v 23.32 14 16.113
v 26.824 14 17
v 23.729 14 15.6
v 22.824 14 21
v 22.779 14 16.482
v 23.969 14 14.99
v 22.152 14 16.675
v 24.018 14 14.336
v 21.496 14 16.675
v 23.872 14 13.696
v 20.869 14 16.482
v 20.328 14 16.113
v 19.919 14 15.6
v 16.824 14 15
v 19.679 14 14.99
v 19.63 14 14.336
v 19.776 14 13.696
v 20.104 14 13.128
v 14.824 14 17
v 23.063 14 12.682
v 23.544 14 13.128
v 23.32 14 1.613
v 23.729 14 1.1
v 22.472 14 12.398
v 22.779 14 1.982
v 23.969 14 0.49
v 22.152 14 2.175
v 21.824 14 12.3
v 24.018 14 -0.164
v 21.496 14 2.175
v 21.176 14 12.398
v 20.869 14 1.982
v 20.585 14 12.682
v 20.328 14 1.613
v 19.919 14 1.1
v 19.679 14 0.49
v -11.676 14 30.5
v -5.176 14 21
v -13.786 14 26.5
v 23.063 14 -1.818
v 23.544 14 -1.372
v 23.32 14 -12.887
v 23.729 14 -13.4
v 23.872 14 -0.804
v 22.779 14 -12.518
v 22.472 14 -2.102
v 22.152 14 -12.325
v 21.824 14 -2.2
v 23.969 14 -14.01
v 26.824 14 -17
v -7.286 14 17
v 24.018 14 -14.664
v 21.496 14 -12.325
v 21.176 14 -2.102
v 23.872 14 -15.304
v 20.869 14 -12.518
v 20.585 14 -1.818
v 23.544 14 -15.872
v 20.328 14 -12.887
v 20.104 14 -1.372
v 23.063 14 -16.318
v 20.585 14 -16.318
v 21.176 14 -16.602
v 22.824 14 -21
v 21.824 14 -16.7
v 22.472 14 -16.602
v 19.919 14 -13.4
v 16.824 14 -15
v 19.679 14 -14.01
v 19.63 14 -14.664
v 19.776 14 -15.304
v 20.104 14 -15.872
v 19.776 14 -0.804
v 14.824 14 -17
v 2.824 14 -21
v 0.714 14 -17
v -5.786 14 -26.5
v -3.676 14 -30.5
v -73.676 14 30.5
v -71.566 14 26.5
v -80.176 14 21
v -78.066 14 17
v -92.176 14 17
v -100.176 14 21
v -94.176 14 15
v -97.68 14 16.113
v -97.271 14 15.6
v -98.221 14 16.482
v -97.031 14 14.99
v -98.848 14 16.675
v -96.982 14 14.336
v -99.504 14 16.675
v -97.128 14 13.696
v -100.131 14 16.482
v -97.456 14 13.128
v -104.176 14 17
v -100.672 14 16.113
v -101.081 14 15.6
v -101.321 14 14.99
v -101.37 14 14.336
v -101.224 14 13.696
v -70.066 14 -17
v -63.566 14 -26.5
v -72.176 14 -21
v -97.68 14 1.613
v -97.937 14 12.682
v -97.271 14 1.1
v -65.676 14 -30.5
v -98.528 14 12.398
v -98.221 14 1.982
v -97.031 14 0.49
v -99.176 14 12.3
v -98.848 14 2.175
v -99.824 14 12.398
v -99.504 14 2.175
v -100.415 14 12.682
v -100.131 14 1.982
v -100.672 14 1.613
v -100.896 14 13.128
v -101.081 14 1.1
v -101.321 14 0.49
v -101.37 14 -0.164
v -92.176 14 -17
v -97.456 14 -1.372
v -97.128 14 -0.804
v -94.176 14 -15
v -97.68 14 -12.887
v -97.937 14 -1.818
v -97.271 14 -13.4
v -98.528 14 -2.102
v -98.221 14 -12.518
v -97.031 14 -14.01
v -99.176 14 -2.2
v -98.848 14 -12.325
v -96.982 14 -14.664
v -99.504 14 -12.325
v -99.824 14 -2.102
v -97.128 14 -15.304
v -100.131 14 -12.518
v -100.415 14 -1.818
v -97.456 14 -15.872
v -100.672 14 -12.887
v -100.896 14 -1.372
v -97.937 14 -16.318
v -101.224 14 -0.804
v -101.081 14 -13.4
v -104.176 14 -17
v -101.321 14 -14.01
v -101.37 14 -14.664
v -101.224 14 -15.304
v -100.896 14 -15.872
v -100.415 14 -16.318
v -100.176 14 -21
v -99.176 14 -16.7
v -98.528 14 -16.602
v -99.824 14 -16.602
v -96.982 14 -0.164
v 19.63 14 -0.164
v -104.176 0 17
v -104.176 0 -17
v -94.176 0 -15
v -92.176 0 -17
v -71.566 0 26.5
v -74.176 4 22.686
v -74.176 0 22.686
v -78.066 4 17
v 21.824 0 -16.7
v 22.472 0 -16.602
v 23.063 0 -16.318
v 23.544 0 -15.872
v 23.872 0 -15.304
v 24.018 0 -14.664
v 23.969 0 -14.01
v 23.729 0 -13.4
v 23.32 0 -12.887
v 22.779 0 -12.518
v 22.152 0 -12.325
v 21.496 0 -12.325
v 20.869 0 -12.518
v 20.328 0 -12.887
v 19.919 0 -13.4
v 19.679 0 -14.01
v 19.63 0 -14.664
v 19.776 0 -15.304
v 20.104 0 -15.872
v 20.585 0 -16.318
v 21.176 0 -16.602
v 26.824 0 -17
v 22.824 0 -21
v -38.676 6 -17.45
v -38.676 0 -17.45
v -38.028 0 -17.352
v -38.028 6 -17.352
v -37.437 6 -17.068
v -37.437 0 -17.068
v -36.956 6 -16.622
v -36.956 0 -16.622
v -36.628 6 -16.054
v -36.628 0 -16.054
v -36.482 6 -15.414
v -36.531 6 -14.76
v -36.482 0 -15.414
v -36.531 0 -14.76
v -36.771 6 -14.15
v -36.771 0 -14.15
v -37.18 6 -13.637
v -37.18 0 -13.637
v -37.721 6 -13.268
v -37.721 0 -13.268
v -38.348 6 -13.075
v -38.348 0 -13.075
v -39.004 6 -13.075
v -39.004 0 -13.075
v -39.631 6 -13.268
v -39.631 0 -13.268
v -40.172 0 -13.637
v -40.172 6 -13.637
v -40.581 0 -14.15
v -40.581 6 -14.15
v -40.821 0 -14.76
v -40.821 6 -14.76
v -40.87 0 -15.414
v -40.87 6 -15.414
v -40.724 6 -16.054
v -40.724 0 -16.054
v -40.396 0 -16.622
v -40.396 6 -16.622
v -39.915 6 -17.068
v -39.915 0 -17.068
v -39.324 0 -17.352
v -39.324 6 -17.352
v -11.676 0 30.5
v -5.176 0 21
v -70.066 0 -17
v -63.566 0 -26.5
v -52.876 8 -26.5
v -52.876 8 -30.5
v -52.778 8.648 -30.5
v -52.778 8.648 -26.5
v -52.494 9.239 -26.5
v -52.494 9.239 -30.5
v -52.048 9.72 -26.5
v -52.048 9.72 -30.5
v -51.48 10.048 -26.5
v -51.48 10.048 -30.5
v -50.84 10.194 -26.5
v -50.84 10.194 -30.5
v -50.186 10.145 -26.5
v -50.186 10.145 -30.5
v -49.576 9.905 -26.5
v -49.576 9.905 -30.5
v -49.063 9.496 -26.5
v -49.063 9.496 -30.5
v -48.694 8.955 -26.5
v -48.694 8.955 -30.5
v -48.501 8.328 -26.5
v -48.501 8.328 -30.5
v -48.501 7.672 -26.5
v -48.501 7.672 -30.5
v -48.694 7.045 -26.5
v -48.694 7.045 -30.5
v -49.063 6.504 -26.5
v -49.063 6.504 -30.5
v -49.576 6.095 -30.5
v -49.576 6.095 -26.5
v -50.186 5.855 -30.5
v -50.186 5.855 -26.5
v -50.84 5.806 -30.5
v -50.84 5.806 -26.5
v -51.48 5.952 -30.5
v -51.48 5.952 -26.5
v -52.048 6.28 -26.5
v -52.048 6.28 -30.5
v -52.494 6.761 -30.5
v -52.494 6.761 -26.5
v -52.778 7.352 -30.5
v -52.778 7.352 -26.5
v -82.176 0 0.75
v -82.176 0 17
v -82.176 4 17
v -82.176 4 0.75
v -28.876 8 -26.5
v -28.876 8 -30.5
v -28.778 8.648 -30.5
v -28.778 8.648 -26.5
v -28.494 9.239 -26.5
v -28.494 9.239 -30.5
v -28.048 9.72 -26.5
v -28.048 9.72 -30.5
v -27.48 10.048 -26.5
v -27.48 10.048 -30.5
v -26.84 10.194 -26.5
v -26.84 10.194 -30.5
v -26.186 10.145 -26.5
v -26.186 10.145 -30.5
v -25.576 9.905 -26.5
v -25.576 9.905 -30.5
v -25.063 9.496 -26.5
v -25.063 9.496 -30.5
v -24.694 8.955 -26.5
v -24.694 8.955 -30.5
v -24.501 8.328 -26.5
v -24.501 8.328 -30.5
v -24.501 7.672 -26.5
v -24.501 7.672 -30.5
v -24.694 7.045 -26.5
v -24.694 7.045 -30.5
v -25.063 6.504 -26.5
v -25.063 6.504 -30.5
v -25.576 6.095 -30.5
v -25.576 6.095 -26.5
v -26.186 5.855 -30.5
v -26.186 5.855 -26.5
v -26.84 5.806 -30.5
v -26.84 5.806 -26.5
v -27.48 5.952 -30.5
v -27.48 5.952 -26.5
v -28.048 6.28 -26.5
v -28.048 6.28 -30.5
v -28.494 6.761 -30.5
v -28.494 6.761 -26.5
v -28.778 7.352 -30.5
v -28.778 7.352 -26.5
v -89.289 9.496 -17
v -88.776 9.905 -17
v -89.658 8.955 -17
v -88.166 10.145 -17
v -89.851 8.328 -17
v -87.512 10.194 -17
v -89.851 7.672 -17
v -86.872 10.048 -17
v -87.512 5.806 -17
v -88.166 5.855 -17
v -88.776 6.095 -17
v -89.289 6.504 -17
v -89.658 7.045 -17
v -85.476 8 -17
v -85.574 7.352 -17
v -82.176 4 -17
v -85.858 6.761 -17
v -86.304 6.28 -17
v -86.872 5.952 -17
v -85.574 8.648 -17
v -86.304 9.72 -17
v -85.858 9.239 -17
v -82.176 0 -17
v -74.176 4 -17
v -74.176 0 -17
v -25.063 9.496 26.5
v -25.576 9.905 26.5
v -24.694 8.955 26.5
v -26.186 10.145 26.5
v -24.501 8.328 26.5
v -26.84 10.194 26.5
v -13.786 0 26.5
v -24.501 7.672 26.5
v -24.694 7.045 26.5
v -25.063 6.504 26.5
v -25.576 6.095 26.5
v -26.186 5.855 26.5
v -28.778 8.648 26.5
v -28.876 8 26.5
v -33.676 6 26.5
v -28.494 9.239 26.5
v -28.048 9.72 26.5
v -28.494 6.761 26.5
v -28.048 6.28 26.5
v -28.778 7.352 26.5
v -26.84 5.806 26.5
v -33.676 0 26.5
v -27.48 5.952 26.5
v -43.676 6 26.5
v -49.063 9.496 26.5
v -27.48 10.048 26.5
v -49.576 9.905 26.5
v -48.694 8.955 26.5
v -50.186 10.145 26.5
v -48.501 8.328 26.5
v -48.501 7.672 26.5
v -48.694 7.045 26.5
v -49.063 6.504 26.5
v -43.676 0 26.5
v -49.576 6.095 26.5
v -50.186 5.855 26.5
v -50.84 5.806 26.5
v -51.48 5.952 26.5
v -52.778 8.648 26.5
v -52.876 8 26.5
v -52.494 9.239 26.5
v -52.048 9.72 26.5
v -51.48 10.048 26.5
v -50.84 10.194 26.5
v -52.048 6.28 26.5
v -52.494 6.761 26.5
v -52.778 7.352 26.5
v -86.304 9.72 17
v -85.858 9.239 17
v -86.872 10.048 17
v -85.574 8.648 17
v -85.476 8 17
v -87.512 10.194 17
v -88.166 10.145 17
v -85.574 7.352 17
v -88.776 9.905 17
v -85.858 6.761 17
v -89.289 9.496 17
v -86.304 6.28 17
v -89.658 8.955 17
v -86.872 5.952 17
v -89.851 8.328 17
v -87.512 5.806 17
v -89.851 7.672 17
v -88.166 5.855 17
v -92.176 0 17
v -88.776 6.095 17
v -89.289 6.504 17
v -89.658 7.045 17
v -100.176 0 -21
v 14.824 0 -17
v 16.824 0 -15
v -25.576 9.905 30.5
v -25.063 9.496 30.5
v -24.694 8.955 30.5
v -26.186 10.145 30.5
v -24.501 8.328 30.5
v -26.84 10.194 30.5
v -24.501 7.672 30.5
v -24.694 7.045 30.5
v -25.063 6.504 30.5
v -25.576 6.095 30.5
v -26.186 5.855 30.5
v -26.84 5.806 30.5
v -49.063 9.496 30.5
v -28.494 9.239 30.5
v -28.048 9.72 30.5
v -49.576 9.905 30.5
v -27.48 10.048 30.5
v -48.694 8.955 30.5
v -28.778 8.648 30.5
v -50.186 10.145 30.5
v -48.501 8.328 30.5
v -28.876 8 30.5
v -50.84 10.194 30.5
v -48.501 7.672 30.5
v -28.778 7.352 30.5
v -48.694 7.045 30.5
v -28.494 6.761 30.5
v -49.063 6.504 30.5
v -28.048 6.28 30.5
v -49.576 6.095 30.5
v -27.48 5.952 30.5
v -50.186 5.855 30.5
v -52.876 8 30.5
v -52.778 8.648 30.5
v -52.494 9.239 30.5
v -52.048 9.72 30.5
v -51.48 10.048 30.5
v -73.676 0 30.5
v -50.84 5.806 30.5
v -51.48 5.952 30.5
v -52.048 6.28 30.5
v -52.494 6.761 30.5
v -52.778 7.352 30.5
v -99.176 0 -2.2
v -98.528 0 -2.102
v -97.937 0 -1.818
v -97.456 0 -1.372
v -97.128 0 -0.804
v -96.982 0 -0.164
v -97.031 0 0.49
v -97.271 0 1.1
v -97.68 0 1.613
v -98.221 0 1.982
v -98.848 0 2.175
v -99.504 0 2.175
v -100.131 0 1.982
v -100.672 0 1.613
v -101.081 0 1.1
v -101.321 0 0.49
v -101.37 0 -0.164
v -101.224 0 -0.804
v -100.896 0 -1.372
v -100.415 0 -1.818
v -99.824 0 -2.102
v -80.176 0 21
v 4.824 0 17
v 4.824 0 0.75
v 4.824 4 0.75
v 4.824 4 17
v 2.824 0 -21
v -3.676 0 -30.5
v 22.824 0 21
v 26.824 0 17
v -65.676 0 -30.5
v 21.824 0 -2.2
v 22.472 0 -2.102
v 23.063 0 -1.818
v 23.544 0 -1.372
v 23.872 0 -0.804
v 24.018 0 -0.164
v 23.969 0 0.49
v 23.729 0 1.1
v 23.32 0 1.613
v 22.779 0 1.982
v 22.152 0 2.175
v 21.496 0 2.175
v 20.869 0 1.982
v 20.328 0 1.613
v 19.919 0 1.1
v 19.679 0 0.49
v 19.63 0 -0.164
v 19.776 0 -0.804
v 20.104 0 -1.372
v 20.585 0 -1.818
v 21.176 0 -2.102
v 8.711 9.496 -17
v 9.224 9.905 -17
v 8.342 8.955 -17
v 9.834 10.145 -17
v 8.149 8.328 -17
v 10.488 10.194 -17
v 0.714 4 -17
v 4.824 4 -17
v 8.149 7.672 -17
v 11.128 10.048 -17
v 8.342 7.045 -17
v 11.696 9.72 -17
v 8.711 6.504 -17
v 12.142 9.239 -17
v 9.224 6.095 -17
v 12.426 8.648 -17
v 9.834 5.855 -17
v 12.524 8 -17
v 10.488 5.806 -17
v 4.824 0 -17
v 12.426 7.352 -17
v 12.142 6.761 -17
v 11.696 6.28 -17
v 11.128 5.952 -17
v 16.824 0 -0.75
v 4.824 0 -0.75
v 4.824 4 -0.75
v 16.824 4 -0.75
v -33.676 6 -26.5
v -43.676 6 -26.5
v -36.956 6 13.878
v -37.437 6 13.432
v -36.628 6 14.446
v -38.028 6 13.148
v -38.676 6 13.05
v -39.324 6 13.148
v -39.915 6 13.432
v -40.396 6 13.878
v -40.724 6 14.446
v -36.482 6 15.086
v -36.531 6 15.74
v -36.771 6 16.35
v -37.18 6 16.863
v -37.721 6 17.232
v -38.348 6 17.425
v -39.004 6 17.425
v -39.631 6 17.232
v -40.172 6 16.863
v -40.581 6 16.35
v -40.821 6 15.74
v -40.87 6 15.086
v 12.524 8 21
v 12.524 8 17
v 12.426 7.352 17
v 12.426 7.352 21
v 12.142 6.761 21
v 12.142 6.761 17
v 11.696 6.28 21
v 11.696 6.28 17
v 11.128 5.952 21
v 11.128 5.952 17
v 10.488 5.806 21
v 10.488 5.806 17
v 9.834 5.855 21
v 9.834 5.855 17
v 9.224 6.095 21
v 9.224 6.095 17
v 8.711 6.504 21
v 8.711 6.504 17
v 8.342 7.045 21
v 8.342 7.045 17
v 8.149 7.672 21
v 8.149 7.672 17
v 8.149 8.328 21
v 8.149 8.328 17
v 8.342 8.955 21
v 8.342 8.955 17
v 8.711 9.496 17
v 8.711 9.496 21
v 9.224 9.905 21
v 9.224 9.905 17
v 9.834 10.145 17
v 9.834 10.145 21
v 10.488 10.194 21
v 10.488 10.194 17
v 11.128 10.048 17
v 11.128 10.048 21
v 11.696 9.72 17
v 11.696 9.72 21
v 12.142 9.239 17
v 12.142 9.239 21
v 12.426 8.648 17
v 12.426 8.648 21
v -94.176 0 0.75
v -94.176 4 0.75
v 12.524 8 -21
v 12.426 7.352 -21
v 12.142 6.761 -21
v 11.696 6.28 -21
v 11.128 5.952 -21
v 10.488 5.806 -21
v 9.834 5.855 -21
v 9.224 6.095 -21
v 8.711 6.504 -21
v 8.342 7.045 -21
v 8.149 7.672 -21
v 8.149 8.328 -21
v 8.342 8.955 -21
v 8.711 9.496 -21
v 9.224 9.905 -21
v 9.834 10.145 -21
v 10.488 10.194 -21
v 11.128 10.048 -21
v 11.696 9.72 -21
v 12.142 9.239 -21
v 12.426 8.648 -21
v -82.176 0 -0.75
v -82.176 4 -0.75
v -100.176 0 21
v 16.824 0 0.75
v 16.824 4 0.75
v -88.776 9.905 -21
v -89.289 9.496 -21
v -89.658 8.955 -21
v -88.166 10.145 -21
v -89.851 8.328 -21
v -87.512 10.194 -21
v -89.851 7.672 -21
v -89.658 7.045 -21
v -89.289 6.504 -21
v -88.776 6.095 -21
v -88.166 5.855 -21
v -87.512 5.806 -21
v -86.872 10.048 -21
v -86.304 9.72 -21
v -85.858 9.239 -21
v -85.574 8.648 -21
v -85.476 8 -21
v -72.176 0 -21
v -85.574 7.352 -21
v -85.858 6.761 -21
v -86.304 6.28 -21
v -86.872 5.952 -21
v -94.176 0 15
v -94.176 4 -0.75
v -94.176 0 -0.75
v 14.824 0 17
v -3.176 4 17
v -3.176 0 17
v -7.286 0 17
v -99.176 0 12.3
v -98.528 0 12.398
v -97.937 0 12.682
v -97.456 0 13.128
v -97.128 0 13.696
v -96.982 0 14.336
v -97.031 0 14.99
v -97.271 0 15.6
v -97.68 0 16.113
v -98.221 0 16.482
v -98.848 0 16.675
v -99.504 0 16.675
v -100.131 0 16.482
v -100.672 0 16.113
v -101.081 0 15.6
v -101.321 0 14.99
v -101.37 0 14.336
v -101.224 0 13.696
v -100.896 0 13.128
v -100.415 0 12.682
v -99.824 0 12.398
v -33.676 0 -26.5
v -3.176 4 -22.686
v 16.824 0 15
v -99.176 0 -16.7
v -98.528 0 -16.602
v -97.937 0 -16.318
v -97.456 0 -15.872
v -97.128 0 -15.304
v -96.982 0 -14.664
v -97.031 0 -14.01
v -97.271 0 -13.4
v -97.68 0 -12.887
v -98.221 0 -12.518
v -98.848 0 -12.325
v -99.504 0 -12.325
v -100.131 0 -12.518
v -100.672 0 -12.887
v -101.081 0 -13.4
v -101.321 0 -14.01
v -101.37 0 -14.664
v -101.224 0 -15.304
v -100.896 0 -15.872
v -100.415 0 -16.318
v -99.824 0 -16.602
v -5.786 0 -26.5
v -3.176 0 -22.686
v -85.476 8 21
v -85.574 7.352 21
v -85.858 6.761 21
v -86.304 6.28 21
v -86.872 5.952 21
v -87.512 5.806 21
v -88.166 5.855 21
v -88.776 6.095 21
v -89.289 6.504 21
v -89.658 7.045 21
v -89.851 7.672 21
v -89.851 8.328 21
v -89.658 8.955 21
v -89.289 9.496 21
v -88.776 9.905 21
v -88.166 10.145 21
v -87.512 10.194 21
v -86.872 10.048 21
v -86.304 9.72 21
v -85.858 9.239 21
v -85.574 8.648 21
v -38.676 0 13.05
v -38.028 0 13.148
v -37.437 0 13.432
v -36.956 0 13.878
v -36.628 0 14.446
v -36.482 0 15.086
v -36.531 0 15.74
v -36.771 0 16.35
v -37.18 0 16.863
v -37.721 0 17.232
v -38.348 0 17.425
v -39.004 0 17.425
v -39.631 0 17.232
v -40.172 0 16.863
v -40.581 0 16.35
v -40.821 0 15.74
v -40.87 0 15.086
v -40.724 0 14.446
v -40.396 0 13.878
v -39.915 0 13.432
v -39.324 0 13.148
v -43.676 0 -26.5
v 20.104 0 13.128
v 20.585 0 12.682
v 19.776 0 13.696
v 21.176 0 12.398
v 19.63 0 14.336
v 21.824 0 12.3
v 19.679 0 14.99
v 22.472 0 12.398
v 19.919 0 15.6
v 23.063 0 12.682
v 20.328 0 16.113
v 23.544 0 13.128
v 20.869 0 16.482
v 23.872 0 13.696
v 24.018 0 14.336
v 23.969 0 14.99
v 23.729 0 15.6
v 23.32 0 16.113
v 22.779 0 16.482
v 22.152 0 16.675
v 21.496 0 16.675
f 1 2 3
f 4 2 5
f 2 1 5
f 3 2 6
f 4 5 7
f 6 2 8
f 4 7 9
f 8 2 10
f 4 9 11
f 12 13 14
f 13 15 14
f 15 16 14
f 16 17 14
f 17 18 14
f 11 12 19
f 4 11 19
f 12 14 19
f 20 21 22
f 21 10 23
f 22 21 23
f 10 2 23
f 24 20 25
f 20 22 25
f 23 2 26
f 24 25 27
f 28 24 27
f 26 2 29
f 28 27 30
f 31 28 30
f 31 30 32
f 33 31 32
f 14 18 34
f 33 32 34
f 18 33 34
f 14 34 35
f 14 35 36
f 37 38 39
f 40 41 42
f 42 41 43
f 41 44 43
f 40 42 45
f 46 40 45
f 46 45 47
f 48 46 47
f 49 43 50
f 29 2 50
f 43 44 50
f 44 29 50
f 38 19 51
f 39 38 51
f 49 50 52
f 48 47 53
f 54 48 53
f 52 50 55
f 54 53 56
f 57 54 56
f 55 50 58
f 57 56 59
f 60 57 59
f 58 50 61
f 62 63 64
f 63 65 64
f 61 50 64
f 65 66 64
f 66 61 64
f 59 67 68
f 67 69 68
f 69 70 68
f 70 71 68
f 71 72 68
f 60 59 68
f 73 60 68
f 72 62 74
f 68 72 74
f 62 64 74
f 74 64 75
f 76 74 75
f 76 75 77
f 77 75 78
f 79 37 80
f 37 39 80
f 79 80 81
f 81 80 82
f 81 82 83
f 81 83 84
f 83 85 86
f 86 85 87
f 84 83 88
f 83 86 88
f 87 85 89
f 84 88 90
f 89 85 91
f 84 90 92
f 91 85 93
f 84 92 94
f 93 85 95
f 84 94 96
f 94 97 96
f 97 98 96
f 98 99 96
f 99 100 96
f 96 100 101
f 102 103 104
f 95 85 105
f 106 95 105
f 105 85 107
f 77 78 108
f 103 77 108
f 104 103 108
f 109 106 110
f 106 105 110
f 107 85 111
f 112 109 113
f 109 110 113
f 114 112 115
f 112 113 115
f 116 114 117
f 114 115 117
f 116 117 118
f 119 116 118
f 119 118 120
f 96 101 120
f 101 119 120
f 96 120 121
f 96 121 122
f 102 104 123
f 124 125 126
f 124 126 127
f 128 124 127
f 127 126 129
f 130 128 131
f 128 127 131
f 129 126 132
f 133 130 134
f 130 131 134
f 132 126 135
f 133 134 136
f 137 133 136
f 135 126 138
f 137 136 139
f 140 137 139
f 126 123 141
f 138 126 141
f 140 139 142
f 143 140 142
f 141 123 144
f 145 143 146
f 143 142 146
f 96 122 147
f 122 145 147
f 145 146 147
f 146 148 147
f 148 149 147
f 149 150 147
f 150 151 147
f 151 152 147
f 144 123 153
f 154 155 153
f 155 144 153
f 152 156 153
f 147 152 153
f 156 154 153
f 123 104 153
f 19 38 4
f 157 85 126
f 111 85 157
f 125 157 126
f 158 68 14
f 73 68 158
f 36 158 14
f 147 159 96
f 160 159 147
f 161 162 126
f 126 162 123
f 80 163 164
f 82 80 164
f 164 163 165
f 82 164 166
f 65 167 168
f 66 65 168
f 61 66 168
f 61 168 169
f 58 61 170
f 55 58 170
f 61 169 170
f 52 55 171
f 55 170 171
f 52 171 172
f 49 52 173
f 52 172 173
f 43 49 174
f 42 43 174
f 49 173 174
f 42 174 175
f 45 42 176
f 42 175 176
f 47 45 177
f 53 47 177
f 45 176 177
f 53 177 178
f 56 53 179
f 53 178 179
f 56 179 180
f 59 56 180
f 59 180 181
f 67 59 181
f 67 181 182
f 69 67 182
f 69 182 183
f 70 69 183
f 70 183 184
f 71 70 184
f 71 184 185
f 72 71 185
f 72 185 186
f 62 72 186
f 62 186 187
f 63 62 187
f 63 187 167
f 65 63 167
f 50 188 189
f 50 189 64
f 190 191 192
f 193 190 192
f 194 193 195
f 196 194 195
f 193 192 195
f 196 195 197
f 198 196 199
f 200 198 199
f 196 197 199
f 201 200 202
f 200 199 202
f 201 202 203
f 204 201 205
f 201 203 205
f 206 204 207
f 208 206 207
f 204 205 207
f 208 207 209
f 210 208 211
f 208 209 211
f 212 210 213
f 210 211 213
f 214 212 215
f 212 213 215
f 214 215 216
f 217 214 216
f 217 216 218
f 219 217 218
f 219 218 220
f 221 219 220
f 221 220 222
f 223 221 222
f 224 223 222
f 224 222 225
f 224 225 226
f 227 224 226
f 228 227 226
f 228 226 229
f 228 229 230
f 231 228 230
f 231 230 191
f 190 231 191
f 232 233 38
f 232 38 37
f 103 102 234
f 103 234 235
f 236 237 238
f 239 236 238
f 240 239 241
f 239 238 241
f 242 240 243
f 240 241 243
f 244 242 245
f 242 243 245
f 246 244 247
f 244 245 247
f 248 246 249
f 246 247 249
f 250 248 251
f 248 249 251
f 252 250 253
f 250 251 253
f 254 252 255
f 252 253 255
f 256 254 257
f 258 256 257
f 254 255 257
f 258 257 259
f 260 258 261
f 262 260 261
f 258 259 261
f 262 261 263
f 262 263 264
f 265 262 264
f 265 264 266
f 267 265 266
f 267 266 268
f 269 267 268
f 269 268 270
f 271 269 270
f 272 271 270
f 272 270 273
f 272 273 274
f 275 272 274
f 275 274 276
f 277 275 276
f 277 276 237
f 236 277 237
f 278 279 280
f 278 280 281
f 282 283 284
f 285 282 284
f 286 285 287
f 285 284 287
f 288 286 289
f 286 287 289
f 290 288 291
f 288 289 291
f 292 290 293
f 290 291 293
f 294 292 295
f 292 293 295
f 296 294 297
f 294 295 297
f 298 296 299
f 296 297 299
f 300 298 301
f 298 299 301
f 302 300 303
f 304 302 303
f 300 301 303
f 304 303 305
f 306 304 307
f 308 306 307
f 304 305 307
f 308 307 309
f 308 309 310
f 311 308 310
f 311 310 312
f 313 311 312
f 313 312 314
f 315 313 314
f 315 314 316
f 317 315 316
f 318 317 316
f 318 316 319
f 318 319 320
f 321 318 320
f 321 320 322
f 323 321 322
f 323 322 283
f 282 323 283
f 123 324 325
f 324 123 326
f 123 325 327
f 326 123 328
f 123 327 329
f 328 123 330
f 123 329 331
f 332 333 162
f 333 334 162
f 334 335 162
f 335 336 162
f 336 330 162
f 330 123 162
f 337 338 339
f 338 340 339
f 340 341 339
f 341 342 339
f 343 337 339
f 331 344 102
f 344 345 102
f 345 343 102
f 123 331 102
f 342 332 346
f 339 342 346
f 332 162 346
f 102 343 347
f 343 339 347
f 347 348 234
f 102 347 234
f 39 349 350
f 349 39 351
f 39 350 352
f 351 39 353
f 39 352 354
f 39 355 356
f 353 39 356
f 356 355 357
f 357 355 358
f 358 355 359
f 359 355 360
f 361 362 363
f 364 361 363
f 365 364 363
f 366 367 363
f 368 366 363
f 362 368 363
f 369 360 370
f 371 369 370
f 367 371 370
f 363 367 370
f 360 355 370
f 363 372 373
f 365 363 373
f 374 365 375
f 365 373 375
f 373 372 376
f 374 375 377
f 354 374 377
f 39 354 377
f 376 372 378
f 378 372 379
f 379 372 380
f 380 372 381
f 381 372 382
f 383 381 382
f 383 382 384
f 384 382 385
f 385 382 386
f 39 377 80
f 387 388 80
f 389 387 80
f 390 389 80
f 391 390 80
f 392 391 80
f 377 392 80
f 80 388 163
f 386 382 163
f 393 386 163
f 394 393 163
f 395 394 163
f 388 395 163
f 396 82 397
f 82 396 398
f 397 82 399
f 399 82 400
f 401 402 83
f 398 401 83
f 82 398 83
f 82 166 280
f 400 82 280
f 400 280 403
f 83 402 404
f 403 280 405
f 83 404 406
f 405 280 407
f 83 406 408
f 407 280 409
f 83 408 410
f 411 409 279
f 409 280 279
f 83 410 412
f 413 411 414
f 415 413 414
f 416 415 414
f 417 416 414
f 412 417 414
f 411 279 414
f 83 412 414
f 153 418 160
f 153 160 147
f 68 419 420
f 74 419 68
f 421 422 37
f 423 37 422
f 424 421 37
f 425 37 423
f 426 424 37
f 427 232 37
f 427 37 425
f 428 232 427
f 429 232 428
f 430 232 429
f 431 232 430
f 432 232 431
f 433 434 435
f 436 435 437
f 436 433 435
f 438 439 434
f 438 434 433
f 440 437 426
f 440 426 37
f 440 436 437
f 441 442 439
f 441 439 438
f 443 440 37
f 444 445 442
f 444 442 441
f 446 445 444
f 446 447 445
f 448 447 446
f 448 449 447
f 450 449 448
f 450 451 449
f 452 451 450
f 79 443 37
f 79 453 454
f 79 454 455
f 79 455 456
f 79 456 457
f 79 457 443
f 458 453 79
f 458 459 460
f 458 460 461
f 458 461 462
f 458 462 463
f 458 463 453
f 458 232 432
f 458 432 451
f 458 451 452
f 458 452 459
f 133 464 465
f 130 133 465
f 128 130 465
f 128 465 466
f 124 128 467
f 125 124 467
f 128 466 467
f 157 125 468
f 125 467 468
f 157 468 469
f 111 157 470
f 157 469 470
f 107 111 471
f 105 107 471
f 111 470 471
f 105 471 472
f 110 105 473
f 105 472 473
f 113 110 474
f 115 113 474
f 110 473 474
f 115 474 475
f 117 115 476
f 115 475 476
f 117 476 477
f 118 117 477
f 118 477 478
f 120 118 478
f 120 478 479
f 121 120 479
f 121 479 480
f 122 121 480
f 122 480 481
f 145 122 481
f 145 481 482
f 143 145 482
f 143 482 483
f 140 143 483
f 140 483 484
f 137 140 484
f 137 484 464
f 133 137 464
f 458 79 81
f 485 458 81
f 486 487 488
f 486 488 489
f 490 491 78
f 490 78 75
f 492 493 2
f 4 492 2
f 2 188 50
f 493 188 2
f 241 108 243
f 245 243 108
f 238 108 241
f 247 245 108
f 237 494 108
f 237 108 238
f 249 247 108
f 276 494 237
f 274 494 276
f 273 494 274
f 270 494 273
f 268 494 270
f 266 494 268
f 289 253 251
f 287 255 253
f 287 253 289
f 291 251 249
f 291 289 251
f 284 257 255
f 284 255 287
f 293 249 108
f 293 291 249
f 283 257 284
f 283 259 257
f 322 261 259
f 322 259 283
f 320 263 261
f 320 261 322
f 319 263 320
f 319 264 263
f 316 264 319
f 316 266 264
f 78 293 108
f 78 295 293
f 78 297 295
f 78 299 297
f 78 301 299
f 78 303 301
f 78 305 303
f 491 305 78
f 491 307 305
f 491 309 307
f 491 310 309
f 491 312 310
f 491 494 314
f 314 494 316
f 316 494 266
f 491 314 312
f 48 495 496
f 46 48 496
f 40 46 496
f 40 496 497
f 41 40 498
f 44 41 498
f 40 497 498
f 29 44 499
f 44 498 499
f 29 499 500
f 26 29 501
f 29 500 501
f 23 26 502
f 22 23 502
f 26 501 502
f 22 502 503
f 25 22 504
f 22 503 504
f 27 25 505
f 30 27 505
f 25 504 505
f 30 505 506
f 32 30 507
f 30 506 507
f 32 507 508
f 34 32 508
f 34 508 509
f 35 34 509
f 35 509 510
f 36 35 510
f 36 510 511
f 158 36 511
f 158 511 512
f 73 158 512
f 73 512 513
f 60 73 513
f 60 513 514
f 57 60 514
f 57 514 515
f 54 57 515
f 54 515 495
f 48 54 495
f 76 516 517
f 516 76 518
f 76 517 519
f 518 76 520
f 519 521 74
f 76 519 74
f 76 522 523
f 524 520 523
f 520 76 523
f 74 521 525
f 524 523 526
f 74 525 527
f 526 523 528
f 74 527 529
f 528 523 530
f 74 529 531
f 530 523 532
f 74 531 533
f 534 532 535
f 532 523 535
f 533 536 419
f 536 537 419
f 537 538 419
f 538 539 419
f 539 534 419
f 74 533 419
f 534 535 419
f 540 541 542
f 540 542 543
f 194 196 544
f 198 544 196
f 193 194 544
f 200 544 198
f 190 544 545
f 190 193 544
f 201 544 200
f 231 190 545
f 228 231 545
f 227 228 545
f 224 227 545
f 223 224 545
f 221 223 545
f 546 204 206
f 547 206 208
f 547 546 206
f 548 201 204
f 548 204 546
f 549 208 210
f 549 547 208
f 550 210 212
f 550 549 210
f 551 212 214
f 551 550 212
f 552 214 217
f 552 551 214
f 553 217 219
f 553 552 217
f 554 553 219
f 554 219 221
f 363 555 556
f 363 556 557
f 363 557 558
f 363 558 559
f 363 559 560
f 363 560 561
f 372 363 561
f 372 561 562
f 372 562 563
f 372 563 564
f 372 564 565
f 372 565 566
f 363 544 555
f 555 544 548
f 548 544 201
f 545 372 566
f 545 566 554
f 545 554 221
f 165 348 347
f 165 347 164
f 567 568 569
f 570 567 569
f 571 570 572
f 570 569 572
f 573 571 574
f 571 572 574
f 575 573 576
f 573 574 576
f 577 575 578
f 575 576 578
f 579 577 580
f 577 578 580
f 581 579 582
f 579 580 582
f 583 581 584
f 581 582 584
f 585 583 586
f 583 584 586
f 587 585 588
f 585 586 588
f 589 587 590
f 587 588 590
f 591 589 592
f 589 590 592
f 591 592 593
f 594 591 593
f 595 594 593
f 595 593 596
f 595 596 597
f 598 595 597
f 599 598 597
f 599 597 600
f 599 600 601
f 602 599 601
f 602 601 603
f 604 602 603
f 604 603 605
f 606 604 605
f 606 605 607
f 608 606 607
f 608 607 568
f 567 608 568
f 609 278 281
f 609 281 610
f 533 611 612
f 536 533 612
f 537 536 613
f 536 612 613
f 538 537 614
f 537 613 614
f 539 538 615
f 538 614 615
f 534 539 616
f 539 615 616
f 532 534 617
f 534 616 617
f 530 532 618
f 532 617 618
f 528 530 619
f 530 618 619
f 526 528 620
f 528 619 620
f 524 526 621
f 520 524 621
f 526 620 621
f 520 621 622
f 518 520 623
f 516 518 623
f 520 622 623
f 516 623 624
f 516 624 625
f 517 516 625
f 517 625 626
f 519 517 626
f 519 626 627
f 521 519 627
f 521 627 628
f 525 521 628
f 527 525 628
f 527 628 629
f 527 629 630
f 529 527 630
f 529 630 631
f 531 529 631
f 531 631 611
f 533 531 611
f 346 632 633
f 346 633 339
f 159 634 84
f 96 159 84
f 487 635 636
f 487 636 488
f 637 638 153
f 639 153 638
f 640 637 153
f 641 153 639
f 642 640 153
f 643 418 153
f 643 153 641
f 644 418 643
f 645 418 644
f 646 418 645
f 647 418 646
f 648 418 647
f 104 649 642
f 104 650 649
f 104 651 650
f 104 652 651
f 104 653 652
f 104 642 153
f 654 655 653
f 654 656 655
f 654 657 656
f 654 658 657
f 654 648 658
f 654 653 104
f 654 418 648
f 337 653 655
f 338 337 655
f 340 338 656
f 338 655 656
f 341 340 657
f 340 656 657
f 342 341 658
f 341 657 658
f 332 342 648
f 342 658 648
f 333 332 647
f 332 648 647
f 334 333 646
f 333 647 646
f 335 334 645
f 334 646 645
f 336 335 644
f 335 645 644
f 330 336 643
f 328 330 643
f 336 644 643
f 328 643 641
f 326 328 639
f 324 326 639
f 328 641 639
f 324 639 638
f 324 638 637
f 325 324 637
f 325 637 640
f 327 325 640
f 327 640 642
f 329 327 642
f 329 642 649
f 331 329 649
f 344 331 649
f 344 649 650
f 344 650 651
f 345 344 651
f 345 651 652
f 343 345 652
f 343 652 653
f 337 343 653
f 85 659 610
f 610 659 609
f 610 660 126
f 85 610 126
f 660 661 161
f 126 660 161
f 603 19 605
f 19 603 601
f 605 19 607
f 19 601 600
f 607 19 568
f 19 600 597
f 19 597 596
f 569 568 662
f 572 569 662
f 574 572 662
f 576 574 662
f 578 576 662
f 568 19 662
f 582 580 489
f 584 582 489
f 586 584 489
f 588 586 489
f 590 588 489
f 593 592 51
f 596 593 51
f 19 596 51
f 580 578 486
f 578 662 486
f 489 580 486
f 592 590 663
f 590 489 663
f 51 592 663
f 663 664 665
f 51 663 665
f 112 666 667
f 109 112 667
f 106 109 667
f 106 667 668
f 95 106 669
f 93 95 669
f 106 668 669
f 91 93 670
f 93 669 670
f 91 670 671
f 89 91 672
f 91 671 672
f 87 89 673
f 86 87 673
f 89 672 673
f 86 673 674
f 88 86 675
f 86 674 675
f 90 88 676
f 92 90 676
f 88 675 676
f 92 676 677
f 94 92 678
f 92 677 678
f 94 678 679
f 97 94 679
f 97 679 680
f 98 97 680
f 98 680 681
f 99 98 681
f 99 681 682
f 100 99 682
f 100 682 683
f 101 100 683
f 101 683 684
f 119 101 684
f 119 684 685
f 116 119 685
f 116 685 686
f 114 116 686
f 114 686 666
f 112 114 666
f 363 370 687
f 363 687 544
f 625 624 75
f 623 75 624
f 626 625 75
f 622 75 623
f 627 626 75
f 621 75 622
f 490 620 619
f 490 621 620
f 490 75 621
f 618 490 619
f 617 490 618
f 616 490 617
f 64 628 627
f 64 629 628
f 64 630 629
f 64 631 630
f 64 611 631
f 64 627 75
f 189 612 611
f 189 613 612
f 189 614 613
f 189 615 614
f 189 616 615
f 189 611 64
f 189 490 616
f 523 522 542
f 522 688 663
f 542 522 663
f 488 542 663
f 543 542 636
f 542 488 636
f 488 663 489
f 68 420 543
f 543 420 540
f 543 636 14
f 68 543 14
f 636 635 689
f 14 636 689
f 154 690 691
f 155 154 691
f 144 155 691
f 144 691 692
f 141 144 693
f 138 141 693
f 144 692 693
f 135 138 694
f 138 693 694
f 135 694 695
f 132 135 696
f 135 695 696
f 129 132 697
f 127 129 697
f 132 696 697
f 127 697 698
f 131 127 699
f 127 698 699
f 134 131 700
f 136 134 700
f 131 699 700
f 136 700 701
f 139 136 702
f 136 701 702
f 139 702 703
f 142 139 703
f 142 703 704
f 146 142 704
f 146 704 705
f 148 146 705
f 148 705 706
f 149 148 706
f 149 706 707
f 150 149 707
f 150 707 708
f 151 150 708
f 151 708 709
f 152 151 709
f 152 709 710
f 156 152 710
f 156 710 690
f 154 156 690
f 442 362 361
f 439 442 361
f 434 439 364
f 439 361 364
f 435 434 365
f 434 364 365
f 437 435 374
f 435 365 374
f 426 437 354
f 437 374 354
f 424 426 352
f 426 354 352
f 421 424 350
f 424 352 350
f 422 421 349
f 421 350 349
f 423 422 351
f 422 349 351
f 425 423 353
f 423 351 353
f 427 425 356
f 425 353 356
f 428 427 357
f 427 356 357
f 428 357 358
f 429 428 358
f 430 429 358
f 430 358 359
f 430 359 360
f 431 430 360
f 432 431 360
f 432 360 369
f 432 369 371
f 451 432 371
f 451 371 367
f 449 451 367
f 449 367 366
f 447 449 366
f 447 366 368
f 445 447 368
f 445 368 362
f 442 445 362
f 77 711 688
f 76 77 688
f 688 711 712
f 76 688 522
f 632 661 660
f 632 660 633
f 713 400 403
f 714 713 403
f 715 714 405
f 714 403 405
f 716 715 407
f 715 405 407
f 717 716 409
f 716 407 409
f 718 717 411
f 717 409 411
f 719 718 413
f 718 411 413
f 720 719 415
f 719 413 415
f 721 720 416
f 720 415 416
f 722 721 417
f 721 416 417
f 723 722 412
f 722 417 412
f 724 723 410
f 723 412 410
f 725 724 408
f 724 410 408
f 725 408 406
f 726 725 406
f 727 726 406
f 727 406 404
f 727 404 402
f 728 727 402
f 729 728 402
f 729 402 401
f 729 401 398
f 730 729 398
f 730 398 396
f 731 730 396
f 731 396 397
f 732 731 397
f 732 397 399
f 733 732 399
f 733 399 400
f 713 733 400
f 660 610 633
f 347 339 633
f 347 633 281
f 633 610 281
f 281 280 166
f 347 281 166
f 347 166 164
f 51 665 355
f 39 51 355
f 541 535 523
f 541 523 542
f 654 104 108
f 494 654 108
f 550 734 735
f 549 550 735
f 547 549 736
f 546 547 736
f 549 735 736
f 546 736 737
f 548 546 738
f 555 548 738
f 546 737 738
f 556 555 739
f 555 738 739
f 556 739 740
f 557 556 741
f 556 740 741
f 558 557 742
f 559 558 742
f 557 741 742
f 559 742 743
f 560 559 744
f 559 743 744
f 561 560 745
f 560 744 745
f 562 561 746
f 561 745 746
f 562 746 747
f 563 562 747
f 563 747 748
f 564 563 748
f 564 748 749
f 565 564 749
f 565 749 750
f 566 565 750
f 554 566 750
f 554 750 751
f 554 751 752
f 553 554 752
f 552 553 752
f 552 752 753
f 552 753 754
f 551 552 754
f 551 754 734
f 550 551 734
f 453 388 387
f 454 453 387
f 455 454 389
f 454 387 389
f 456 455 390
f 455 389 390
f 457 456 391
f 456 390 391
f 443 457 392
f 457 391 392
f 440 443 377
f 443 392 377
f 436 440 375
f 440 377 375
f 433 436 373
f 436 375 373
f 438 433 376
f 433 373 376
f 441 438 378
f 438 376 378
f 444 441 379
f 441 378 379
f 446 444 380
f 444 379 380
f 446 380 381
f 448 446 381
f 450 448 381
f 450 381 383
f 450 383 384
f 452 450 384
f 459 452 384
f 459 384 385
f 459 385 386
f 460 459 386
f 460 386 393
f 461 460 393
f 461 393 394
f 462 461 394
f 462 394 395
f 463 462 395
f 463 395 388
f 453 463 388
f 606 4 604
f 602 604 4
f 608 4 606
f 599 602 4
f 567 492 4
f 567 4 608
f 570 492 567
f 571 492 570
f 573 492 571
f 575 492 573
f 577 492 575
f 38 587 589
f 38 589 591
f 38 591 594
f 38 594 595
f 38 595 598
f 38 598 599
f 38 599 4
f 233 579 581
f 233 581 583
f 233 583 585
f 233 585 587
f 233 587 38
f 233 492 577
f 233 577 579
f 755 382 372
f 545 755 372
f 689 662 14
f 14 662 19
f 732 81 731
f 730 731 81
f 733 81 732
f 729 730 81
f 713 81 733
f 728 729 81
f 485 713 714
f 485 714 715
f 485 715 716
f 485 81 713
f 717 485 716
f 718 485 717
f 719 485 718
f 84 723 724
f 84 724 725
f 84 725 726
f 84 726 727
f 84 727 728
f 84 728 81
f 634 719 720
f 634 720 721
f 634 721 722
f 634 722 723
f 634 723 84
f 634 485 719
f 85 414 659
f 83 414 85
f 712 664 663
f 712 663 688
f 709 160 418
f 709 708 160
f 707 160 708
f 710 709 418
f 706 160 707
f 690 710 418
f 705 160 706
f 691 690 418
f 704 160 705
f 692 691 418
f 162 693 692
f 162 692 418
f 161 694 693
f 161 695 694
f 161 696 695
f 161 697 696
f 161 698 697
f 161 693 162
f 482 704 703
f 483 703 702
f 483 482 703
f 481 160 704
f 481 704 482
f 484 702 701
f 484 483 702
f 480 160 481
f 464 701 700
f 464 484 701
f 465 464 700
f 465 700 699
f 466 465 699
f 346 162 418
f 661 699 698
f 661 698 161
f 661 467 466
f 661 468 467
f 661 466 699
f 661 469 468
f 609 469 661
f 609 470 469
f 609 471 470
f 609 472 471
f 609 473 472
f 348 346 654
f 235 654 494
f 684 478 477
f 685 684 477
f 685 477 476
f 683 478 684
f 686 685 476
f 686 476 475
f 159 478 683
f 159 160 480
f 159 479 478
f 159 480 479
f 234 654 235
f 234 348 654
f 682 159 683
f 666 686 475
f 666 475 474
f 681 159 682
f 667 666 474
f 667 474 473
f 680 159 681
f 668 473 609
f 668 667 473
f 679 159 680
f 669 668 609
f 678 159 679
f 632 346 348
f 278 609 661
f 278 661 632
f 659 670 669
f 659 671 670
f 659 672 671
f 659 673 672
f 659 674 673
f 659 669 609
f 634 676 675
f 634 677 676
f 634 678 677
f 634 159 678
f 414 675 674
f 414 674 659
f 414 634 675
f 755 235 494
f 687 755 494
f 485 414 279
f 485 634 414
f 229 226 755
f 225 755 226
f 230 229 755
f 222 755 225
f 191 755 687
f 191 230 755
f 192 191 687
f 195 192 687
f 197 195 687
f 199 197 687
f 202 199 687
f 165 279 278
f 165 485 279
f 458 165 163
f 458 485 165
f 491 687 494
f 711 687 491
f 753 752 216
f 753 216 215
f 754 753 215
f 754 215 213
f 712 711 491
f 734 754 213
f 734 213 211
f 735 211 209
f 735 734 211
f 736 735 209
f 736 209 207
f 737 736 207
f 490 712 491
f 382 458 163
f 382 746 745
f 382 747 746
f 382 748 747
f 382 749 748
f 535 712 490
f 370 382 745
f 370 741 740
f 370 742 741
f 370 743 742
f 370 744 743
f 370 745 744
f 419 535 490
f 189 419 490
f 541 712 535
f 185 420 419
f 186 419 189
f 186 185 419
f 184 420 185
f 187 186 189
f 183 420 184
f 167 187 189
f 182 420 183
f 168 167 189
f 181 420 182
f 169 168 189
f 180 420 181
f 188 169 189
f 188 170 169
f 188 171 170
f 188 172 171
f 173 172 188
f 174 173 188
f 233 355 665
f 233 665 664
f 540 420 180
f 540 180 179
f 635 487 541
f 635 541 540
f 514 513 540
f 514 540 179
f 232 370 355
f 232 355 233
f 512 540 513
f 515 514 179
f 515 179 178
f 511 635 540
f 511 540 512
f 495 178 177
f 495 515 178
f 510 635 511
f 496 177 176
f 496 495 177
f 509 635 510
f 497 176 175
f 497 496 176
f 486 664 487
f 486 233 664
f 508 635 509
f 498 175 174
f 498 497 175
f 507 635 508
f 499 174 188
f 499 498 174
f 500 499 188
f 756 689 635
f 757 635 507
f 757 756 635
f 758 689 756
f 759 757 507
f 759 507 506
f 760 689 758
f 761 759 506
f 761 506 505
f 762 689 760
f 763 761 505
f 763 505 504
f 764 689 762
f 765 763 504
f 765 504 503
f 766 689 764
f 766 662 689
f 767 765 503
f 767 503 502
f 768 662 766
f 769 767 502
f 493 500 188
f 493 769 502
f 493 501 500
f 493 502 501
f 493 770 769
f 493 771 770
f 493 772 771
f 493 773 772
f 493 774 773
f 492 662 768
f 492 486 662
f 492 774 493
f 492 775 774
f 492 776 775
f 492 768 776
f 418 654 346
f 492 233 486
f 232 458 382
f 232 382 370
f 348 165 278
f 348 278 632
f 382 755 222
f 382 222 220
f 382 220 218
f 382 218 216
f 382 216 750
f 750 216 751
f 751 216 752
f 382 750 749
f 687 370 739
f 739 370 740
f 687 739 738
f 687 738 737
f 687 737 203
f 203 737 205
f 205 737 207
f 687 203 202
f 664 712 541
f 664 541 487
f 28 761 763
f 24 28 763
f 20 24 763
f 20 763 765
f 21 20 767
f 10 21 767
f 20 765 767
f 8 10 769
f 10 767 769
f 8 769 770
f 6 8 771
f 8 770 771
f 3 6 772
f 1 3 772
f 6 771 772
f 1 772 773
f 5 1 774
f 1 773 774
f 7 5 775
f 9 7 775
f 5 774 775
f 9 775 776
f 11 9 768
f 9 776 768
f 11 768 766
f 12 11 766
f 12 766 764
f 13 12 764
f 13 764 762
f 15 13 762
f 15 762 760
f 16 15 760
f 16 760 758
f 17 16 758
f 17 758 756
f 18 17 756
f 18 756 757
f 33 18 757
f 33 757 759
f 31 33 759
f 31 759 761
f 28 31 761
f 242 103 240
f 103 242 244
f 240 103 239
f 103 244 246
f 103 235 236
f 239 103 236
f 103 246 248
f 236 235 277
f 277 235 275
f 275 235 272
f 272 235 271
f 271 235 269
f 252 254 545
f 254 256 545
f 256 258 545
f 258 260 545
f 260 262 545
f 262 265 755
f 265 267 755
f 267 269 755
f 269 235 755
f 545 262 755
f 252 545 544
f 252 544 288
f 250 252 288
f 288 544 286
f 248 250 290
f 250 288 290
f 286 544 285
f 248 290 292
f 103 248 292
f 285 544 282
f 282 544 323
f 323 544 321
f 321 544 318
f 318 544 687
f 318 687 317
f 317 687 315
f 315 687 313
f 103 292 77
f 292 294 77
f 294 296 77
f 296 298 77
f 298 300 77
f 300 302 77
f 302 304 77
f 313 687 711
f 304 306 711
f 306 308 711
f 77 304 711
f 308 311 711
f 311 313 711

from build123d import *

# Parameters (mm, degrees)
BOSS_EXTRUDE1_DEPTH = 14
CUT_EXTRUDE1_REACH  = 16
SKETCH2_R           = 2.2
SKETCH5_R           = 2.2
CUT_EXTRUDE2_DEPTH  = 62
BOSS_EXTRUDE2_REACH = 59
SKETCH6_W           = 10
SKETCH6_H           = 6
BOSS_EXTRUDE3_DEPTH = 4
CUT_EXTRUDE3_REACH  = 16
SKETCH8_R           = 2.2
CHAMFER1_SIZE       = 4
CHAMFER2_SIZE       = 2


with BuildPart() as part:
    # Sketch1 → Boss-Extrude1 (new body)
    with BuildSketch(Plane(origin=(0, 0, 0), x_dir=(1, 0, 0), z_dir=(0, 1, 0))):
        Polygon((-104.176003517, -21), (-104.176003517, 21), (-72.176003517, 21), (-65.676003517, 30.5), (-3.676003517, 30.5), (2.823996483, 21), (26.823996483, 21), (26.823996483, -21), (-5.176003517, -21), (-11.676003517, -30.5), (-73.676003517, -30.5), (-80.176003517, -21), align=None)
        Polygon((-94.176003517, -17), (-94.176003517, 17), (-70.066165861, 17), (-63.566165861, 26.5), (-5.785841173, 26.5), (0.714158827, 17), (16.823996483, 17), (16.823996483, -17), (-7.285841173, -17), (-13.785841173, -26.5), (-71.566165861, -26.5), (-78.066165861, -17), align=None, mode=Mode.SUBTRACT)
    extrude(amount=BOSS_EXTRUDE1_DEPTH)

    # Sketch2 → Cut-Extrude1 (cut, up to next)
    with BuildSketch(Plane(origin=(0, 0, 0), x_dir=(-1, 0, 0), z_dir=(0, -1, 0)), mode=Mode.PRIVATE) as cut_extrude1_sk1:
        with Locations(Location((99.176003517, 14.5, 0), (0, 0, 90))):  # turned: the seam where the file's is
            Circle(SKETCH2_R)
    cut_extrude1_tool1 = extrude(cut_extrude1_sk1.sketch, amount=-CUT_EXTRUDE1_REACH, mode=Mode.PRIVATE) & part.part
    add(cut_extrude1_tool1.solids().sort_by_distance((-99.176004, 0, -14.5))[0], mode=Mode.SUBTRACT)
    # Sketch2 → Cut-Extrude1 (cut, up to next)
    with BuildSketch(Plane(origin=(0, 0, 0), x_dir=(-1, 0, 0), z_dir=(0, -1, 0)), mode=Mode.PRIVATE) as cut_extrude1_sk2:
        with Locations(Location((99.176003517, 0, 0), (0, 0, 90))):  # turned: the seam where the file's is
            Circle(SKETCH2_R)
    cut_extrude1_tool2 = extrude(cut_extrude1_sk2.sketch, amount=-CUT_EXTRUDE1_REACH, mode=Mode.PRIVATE) & part.part
    add(cut_extrude1_tool2.solids().sort_by_distance((-99.176004, 0, 0))[0], mode=Mode.SUBTRACT)
    # Sketch2 → Cut-Extrude1 (cut, up to next)
    with BuildSketch(Plane(origin=(0, 0, 0), x_dir=(-1, 0, 0), z_dir=(0, -1, 0)), mode=Mode.PRIVATE) as cut_extrude1_sk3:
        with Locations(Location((99.176003517, -14.5, 0), (0, 0, 90))):  # turned: the seam where the file's is
            Circle(SKETCH2_R)
    cut_extrude1_tool3 = extrude(cut_extrude1_sk3.sketch, amount=-CUT_EXTRUDE1_REACH, mode=Mode.PRIVATE) & part.part
    add(cut_extrude1_tool3.solids().sort_by_distance((-99.176004, 0, 14.5))[0], mode=Mode.SUBTRACT)
    # Sketch2 → Cut-Extrude1 (cut, up to next)
    with BuildSketch(Plane(origin=(0, 0, 0), x_dir=(-1, 0, 0), z_dir=(0, -1, 0)), mode=Mode.PRIVATE) as cut_extrude1_sk4:
        with Locations(Location((-21.823996483, -14.5, 0), (0, 0, 90))):  # turned: the seam where the file's is
            Circle(SKETCH2_R)
    cut_extrude1_tool4 = extrude(cut_extrude1_sk4.sketch, amount=-CUT_EXTRUDE1_REACH, mode=Mode.PRIVATE) & part.part
    add(cut_extrude1_tool4.solids().sort_by_distance((21.823996, 0, 14.5))[0], mode=Mode.SUBTRACT)
    # Sketch2 → Cut-Extrude1 (cut, up to next)
    with BuildSketch(Plane(origin=(0, 0, 0), x_dir=(-1, 0, 0), z_dir=(0, -1, 0)), mode=Mode.PRIVATE) as cut_extrude1_sk5:
        with Locations(Location((-21.823996483, 0, 0), (0, 0, 90))):  # turned: the seam where the file's is
            Circle(SKETCH2_R)
    cut_extrude1_tool5 = extrude(cut_extrude1_sk5.sketch, amount=-CUT_EXTRUDE1_REACH, mode=Mode.PRIVATE) & part.part
    add(cut_extrude1_tool5.solids().sort_by_distance((21.823996, 0, 0))[0], mode=Mode.SUBTRACT)
    # Sketch2 → Cut-Extrude1 (cut, up to next)
    with BuildSketch(Plane(origin=(0, 0, 0), x_dir=(-1, 0, 0), z_dir=(0, -1, 0)), mode=Mode.PRIVATE) as cut_extrude1_sk6:
        with Locations(Location((-21.823996483, 14.5, 0), (0, 0, 90))):  # turned: the seam where the file's is
            Circle(SKETCH2_R)
    cut_extrude1_tool6 = extrude(cut_extrude1_sk6.sketch, amount=-CUT_EXTRUDE1_REACH, mode=Mode.PRIVATE) & part.part
    add(cut_extrude1_tool6.solids().sort_by_distance((21.823996, 0, -14.5))[0], mode=Mode.SUBTRACT)

    # Sketch5 → Cut-Extrude2 (cut, through all)
    with BuildSketch(Plane(origin=(0, 0, -30.5), x_dir=(-1, 0, 0), z_dir=(0, 0, -1))):
        with Locations((50.676003517, 8)):
            Circle(SKETCH5_R)
        with Locations((26.676003517, 8)):
            Circle(SKETCH5_R)
        with Locations(Location((87.676003517, 8, 0), (0, 0, 180))):  # turned: the seam where the file's is
            Circle(SKETCH5_R)
        with Locations(Location((-10.323996483, 8, 0), (0, 0, 180))):  # turned: the seam where the file's is
            Circle(SKETCH5_R)
    extrude(amount=-CUT_EXTRUDE2_DEPTH, mode=Mode.SUBTRACT)

    # Sketch6 → Boss-Extrude2 (add, up to next)
    with BuildSketch(Plane(origin=(0, 0, 26.5), x_dir=(-1, 0, 0), z_dir=(0, 0, -1)), mode=Mode.PRIVATE) as boss_extrude2_sk1:
        with Locations((38.676003517, 3)):
            Rectangle(SKETCH6_W, SKETCH6_H)
    boss_extrude2_tool1 = extrude(boss_extrude2_sk1.sketch, amount=BOSS_EXTRUDE2_REACH, mode=Mode.PRIVATE) - part.part
    add(boss_extrude2_tool1.solids().sort_by_distance((-38.676004, 3, 26.5))[0])

    # Sketch7 → Boss-Extrude3 (add)
    with BuildSketch(Plane.XZ):
        Polygon((-78.066165861, 17), (-82.176003517, 17), (-82.176003517, 0.75), (-94.176003517, 0.75), (-94.176003517, -0.75), (-82.176003517, -0.75), (-82.176003517, -17), (-74.176003517, -17), (-74.176003517, 22.685621887), align=None)
        Polygon((4.823996483, -17), (4.823996483, -0.75), (16.823996483, -0.75), (16.823996483, 0.75), (4.823996483, 0.75), (4.823996483, 17), (-3.176003517, 17), (-3.176003517, -22.685621887), (0.714158827, -17), align=None)
    extrude(amount=-BOSS_EXTRUDE3_DEPTH)

    # Sketch8 → Cut-Extrude3 (cut, up to next)
    with BuildSketch(Plane(origin=(0, 0, 0), x_dir=(-1, 0, 0), z_dir=(0, -1, 0)), mode=Mode.PRIVATE) as cut_extrude3_sk1:
        with Locations(Location((38.676003517, -15.25, 0), (0, 0, 90))):  # turned: the seam where the file's is
            Circle(SKETCH8_R)
    cut_extrude3_tool1 = extrude(cut_extrude3_sk1.sketch, amount=-CUT_EXTRUDE3_REACH, mode=Mode.PRIVATE) & part.part
    add(cut_extrude3_tool1.solids().sort_by_distance((-38.676004, 0, 15.25))[0], mode=Mode.SUBTRACT)
    # Sketch8 → Cut-Extrude3 (cut, up to next)
    with BuildSketch(Plane(origin=(0, 0, 0), x_dir=(-1, 0, 0), z_dir=(0, -1, 0)), mode=Mode.PRIVATE) as cut_extrude3_sk2:
        with Locations(Location((38.676003517, 15.25, 0), (0, 0, 90))):  # turned: the seam where the file's is
            Circle(SKETCH8_R)
    cut_extrude3_tool2 = extrude(cut_extrude3_sk2.sketch, amount=-CUT_EXTRUDE3_REACH, mode=Mode.PRIVATE) & part.part
    add(cut_extrude3_tool2.solids().sort_by_distance((-38.676004, 0, -15.25))[0], mode=Mode.SUBTRACT)

    # Chamfer1
    chamfer1_edges = [part.edges().sort_by_distance(p)[0] for p in [
        (-104.176003517, 7, 21),
        (-104.176003517, 7, -21),
        (26.823996483, 7, -21),
        (26.823996483, 7, 21),
    ]]
    chamfer(chamfer1_edges, length=CHAMFER1_SIZE)

    # Chamfer2
    chamfer2_edges = [part.edges().sort_by_distance(p)[0] for p in [
        (-94.176003517, 7, 17),
        (16.823996483, 7, 17),
        (16.823996483, 7, -17),
        (-94.176003517, 7, -17),
    ]]
    chamfer(chamfer2_edges, length=CHAMFER2_SIZE)


solid = part.part
